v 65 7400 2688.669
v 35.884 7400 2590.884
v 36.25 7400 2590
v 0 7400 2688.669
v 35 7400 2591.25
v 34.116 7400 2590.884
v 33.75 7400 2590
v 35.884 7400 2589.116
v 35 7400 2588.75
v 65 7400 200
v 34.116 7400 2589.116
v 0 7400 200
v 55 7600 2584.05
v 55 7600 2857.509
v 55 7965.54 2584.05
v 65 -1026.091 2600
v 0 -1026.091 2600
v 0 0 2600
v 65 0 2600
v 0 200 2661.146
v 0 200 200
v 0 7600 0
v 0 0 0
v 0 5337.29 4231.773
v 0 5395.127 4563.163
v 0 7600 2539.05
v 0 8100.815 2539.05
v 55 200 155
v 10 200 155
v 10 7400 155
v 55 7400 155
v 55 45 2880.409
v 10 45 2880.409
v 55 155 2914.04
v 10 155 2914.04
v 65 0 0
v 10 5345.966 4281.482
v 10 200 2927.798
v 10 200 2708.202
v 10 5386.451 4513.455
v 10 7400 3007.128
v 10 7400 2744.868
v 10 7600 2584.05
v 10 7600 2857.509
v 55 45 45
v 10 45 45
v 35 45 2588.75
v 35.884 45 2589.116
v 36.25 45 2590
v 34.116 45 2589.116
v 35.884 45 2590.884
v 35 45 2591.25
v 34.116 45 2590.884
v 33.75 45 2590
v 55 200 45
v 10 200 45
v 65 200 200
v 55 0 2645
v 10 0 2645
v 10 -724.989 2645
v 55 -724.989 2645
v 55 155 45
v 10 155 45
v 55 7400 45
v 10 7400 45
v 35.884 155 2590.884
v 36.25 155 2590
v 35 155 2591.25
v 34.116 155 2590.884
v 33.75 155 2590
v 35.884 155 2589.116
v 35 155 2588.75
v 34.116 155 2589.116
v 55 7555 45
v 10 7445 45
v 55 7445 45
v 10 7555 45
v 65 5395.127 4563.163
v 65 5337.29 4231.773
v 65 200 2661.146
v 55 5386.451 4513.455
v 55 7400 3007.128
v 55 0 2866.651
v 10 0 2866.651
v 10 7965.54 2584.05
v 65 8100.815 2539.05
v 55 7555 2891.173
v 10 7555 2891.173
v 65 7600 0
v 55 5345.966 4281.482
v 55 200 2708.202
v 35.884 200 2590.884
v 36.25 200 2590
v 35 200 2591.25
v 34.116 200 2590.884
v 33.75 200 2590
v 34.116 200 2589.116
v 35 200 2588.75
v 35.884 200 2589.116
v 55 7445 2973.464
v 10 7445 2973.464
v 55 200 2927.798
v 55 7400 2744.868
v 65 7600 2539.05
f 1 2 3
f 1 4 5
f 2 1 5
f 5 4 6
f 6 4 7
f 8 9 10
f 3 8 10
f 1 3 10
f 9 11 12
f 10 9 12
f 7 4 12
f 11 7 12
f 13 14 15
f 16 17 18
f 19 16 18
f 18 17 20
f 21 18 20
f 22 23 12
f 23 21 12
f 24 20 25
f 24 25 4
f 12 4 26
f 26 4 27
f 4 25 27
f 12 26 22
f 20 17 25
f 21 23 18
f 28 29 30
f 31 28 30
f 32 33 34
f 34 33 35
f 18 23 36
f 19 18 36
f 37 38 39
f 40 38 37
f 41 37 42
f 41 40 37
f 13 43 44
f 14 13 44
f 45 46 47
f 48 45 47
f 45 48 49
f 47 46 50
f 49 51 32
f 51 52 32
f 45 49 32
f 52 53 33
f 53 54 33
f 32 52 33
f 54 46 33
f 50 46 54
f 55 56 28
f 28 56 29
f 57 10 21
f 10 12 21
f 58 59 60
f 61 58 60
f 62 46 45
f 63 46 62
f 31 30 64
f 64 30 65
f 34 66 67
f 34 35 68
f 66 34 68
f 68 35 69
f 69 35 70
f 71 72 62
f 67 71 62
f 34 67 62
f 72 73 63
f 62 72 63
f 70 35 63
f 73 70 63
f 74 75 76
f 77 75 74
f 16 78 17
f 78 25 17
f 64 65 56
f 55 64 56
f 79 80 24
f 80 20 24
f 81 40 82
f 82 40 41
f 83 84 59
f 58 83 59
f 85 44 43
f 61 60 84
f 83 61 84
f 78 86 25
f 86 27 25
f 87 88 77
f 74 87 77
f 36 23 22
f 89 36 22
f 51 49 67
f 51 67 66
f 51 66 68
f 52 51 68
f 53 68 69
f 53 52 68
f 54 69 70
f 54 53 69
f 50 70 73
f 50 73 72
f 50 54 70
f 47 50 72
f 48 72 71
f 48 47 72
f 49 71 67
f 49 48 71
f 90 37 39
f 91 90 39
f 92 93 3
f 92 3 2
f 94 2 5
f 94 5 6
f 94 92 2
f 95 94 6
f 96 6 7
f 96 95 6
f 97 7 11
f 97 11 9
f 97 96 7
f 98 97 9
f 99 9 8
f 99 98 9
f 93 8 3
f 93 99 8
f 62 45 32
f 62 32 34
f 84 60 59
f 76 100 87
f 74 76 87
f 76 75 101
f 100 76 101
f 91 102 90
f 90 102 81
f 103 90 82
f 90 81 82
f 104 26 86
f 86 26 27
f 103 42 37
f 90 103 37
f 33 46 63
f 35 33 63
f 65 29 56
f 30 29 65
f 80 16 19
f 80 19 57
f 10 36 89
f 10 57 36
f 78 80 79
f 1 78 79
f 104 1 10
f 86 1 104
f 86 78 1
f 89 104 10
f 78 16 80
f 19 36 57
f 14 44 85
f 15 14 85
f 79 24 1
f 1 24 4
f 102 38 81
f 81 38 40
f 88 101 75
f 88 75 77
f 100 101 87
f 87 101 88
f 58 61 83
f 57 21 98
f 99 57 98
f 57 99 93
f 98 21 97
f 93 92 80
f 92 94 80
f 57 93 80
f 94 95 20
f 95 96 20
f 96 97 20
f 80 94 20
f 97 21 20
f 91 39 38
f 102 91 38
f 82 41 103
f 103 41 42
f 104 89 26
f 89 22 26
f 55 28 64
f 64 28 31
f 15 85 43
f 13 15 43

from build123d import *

# Parameters (mm, degrees)
F1_DEPTH = 10
F2_W     = 7200
F2_H     = 45
F2_W_2   = 45
F2_W_3   = 110
F3_DEPTH = 45
F4_W     = 7200
F4_H     = 110
F5_DEPTH = 10
F6_R     = 1.25
F7_DEPTH = 7400


with BuildPart() as f1:
    # F0 (on Right) → F1 (new body)
    with BuildSketch(Plane.YZ):
        Polygon((0, 2600), (0, 0), (7600, 0), (7600, 2539.0500439446), (7600, 2913.7075269461), (5395.1268947942, 4563.1633490475), (0, 2913.7075269461), align=None)
        Polygon((7400, 200), (200, 200), (200, 2661.1461362917), (5337.2900782842, 4231.7733327764), (7400, 2688.6691597302), align=None, mode=Mode.SUBTRACT)
        Polygon((-1026.09108595, 2600), (0, 2600), (0, 2913.7075269461), align=None)
        Polygon((7600, 2913.7075269461), (7600, 2539.0500439446), (8100.8149941729, 2539.0500439446), align=None)
    extrude(amount=F1_DEPTH)

    # F2 (on face) → F3 (join)
    with BuildSketch(Plane.YZ.offset(10)):
        Polygon((-724.9890552257, 2645), (-872.1774230575, 2600), (0, 2600), (0, 2645), align=None)
        Polygon((-1026.09108595, 2600), (-872.1774230575, 2600), (-724.9890552257, 2645), (0, 2866.6513979042), (45, 2880.4092785699), (155, 2914.0396535303), (200, 2927.797534196), (5386.4513723177, 4513.4548466069), (5395.1268947942, 4563.1633490475), align=None)
        Polygon((0, 2645), (0, 2600), (0, 0), (45, 0), (45, 45), (45, 2880.4092785699), (0, 2866.6513979042), align=None)
        Polygon((200, 2927.797534196), (155, 2914.0396535303), (155, 45), (155, 0), (200, 0), (200, 45), (200, 155), (200, 200), (200, 2661.1461362917), (200, 2708.2022653337), align=None)
        Polygon((5345.9656007607, 4281.4818352171), (200, 2708.2022653337), (200, 2661.1461362917), (5337.2900782842, 4231.7733327764), align=None)
        with Locations((3800, 177.5)):
            Rectangle(F2_W, F2_H)
        with Locations((3800, 22.5)):
            Rectangle(F2_W, F2_H)
        Polygon((7400, 2688.6691597302), (7400, 2744.8677821804), (5345.9656007607, 4281.4818352171), (5337.2900782842, 4231.7733327764), align=None)
        Polygon((8100.8149941729, 2539.0500439446), (5395.1268947942, 4563.1633490475), (5386.4513723177, 4513.4548466069), (7400, 3007.1280202815), (7445, 2973.4637192297), (7555, 2891.1732055477), (7600, 2857.5089044959), (7965.5400035156, 2584.0500439446), (8025.6927450469, 2539.0500439446), align=None)
        with Locations((7422.5, 22.5)):
            Rectangle(F2_W_2, F2_H)
        Polygon((7445, 2973.4637192297), (7400, 3007.1280202815), (7400, 2744.8677821804), (7400, 2688.6691597302), (7400, 200), (7400, 155), (7400, 45), (7445, 45), align=None)
        Polygon((7600, 0), (7600, 2539.0500439446), (7600, 2584.0500439446), (7600, 2857.5089044959), (7555, 2891.1732055477), (7555, 45), (7555, 0), align=None)
        Polygon((7600, 2539.0500439446), (8025.6927450469, 2539.0500439446), (7965.5400035156, 2584.0500439446), (7600, 2584.0500439446), align=None)
        with Locations((7500, 22.5)):
            Rectangle(F2_W_3, F2_H)
        with Locations((100, 22.5)):
            Rectangle(F2_W_3, F2_H)
    extrude(amount=F3_DEPTH)

    # F4 (on face) → F5 (join)
    with BuildSketch(Plane.YZ.offset(55)):
        Polygon((0, 0), (7600, 0), (7600, 2539.0500439446), (8100.8149941729, 2539.0500439446), (5395.1268947942, 4563.1633490475), (-1026.09108595, 2600), (0, 2600), align=None)
        Polygon((155, 45), (45, 45), (45, 2880.4092785699), (155, 2914.0396535303), align=None, mode=Mode.SUBTRACT)
        with Locations((3800, 100)):
            Rectangle(F4_W, F4_H, mode=Mode.SUBTRACT)
        Polygon((200, 2661.1461362917), (5337.2900782842, 4231.7733327764), (7400, 2688.6691597302), (7400, 200), (200, 200), align=None, mode=Mode.SUBTRACT)
        Polygon((7555, 45), (7445, 45), (7445, 2973.4637192297), (7555, 2891.1732055477), align=None, mode=Mode.SUBTRACT)
        Polygon((0, 2866.6513979042), (0, 2645), (-724.9890552257, 2645), align=None, mode=Mode.SUBTRACT)
        Polygon((7965.5400035156, 2584.0500439446), (7600, 2584.0500439446), (7600, 2857.5089044959), align=None, mode=Mode.SUBTRACT)
        Polygon((200, 2927.797534196), (5386.4513723177, 4513.4548466069), (7400, 3007.1280202815), (7400, 2744.8677821804), (5345.9656007607, 4281.4818352171), (200, 2708.2022653337), align=None, mode=Mode.SUBTRACT)
        Polygon((7400, 3007.1280202815), (5386.4513723177, 4513.4548466069), (200, 2927.797534196), (200, 2708.2022653337), (5345.9656007607, 4281.4818352171), (7400, 2744.8677821804), align=None)
        with Locations((3800, 100)):
            Rectangle(F4_W, F4_H)
        Polygon((7445, 2973.4637192297), (7445, 45), (7555, 45), (7555, 2891.1732055477), align=None)
        Polygon((45, 2880.4092785699), (45, 45), (155, 45), (155, 2914.0396535303), align=None)
        Polygon((-724.9890552257, 2645), (0, 2645), (0, 2866.6513979042), align=None)
        Polygon((7600, 2857.5089044959), (7600, 2584.0500439446), (7965.5400035156, 2584.0500439446), align=None)
    extrude(amount=F5_DEPTH)

    # F6 (on face) → F7 (join, through all)
    with BuildSketch(Plane.XZ):
        with Locations((35, 2590)):
            Circle(F6_R)
    extrude(amount=-F7_DEPTH)


solid = f1.part
